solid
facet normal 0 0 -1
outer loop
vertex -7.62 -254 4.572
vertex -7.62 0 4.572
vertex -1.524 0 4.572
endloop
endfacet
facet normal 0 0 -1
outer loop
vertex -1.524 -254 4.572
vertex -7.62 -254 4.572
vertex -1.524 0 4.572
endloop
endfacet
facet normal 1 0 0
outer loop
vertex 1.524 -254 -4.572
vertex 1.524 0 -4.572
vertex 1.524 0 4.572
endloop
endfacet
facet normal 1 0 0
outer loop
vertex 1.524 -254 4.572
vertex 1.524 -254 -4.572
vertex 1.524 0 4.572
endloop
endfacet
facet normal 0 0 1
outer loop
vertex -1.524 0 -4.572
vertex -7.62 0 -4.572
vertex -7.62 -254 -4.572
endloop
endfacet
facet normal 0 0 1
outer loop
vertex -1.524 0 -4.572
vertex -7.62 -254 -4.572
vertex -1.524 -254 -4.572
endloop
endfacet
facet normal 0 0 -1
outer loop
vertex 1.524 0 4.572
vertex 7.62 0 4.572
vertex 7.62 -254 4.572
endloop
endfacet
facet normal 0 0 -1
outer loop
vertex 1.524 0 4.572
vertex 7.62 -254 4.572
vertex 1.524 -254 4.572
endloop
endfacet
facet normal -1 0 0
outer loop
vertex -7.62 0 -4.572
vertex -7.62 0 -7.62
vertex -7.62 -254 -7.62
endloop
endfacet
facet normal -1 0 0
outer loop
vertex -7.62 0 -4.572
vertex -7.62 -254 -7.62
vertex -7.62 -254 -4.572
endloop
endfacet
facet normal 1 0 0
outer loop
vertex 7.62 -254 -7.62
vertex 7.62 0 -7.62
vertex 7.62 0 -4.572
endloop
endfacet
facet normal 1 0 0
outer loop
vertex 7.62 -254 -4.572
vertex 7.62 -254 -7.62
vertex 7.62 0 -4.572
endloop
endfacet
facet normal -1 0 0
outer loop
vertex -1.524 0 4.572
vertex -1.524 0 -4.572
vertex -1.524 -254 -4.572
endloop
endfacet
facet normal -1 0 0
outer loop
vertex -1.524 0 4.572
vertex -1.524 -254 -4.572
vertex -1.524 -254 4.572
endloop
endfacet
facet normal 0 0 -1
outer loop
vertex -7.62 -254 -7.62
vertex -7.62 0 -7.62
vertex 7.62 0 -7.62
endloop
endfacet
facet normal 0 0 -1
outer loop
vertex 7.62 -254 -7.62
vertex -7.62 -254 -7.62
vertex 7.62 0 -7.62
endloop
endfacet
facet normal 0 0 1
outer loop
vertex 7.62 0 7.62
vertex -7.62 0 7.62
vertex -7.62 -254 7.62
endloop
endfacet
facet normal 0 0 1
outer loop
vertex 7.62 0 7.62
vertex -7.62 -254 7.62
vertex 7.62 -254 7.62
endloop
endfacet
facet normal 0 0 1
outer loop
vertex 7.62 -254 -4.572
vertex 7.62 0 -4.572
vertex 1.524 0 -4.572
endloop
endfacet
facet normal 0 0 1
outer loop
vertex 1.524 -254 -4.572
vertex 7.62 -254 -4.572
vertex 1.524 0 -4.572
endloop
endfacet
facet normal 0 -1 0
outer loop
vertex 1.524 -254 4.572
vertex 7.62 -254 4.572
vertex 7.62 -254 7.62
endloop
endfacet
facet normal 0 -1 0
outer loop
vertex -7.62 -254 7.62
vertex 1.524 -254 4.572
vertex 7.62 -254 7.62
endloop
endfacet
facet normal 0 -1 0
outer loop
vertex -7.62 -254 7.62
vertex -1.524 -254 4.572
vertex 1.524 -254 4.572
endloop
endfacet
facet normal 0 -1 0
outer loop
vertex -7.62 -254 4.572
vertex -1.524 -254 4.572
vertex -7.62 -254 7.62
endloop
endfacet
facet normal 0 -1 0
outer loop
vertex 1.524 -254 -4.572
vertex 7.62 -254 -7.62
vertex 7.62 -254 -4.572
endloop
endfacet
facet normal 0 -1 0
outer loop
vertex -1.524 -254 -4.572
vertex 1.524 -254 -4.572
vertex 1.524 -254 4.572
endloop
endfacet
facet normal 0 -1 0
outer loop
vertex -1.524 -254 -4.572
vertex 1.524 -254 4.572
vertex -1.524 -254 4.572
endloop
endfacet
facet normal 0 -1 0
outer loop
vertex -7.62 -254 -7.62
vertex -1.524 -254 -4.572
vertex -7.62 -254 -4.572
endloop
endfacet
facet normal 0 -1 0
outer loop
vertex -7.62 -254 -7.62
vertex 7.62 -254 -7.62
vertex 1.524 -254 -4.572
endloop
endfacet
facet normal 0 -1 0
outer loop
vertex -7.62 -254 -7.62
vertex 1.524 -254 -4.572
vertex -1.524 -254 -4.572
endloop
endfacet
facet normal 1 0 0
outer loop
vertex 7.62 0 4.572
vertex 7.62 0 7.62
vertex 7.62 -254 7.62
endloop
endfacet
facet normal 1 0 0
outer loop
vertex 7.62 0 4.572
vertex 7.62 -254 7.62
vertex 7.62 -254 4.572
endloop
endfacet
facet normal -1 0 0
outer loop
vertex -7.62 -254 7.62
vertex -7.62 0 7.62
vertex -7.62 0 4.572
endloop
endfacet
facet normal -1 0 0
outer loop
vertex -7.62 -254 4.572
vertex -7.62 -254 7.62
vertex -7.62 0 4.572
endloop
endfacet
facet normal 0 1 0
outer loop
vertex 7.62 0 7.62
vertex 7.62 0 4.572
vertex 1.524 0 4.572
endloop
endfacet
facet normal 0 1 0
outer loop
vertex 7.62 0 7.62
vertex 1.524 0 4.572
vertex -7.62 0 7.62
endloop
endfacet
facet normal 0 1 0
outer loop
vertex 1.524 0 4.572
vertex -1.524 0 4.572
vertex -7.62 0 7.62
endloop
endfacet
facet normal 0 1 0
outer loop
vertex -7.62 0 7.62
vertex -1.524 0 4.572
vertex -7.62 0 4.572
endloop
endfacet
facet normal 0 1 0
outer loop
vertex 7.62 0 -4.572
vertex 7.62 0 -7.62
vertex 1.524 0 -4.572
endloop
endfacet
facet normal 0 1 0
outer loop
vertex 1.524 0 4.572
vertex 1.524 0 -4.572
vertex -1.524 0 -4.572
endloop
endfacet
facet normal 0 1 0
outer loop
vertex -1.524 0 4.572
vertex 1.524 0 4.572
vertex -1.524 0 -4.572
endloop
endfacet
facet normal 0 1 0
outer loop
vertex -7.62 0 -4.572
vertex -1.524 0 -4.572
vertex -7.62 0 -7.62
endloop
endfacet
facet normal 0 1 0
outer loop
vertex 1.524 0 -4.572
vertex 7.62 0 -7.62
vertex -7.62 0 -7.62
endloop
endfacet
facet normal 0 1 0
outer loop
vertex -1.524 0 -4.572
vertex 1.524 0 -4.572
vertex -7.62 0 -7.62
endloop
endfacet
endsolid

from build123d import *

# Parameters (mm, degrees)
F1_DEPTH = 254


with BuildPart() as f1:
    # F0 (on Front) → F1 (new body)
    with BuildSketch(Plane.XZ):
        Polygon((-1.524, 0), (0, 0), (0, 7.62), (-7.62, 7.62), (-7.62, 4.572), (-1.524, 4.572), align=None)
    extrude(amount=F1_DEPTH)

    # F2: F1 across face


with BuildPart() as f1_1:
    add(f1.part)
    add(f1.part.mirror(Plane(origin=(0, -127, 3.81), x_dir=(0, 1, 0), z_dir=(1, 0, 0))))

    # F3: F1 across face


with BuildPart() as f1_2:
    add(f1_1.part)
    add(f1_1.part.mirror(Plane(origin=(0, -127, 0), x_dir=(1, 0, 0), z_dir=(0, 0, -1))))


solid = f1_2.part
